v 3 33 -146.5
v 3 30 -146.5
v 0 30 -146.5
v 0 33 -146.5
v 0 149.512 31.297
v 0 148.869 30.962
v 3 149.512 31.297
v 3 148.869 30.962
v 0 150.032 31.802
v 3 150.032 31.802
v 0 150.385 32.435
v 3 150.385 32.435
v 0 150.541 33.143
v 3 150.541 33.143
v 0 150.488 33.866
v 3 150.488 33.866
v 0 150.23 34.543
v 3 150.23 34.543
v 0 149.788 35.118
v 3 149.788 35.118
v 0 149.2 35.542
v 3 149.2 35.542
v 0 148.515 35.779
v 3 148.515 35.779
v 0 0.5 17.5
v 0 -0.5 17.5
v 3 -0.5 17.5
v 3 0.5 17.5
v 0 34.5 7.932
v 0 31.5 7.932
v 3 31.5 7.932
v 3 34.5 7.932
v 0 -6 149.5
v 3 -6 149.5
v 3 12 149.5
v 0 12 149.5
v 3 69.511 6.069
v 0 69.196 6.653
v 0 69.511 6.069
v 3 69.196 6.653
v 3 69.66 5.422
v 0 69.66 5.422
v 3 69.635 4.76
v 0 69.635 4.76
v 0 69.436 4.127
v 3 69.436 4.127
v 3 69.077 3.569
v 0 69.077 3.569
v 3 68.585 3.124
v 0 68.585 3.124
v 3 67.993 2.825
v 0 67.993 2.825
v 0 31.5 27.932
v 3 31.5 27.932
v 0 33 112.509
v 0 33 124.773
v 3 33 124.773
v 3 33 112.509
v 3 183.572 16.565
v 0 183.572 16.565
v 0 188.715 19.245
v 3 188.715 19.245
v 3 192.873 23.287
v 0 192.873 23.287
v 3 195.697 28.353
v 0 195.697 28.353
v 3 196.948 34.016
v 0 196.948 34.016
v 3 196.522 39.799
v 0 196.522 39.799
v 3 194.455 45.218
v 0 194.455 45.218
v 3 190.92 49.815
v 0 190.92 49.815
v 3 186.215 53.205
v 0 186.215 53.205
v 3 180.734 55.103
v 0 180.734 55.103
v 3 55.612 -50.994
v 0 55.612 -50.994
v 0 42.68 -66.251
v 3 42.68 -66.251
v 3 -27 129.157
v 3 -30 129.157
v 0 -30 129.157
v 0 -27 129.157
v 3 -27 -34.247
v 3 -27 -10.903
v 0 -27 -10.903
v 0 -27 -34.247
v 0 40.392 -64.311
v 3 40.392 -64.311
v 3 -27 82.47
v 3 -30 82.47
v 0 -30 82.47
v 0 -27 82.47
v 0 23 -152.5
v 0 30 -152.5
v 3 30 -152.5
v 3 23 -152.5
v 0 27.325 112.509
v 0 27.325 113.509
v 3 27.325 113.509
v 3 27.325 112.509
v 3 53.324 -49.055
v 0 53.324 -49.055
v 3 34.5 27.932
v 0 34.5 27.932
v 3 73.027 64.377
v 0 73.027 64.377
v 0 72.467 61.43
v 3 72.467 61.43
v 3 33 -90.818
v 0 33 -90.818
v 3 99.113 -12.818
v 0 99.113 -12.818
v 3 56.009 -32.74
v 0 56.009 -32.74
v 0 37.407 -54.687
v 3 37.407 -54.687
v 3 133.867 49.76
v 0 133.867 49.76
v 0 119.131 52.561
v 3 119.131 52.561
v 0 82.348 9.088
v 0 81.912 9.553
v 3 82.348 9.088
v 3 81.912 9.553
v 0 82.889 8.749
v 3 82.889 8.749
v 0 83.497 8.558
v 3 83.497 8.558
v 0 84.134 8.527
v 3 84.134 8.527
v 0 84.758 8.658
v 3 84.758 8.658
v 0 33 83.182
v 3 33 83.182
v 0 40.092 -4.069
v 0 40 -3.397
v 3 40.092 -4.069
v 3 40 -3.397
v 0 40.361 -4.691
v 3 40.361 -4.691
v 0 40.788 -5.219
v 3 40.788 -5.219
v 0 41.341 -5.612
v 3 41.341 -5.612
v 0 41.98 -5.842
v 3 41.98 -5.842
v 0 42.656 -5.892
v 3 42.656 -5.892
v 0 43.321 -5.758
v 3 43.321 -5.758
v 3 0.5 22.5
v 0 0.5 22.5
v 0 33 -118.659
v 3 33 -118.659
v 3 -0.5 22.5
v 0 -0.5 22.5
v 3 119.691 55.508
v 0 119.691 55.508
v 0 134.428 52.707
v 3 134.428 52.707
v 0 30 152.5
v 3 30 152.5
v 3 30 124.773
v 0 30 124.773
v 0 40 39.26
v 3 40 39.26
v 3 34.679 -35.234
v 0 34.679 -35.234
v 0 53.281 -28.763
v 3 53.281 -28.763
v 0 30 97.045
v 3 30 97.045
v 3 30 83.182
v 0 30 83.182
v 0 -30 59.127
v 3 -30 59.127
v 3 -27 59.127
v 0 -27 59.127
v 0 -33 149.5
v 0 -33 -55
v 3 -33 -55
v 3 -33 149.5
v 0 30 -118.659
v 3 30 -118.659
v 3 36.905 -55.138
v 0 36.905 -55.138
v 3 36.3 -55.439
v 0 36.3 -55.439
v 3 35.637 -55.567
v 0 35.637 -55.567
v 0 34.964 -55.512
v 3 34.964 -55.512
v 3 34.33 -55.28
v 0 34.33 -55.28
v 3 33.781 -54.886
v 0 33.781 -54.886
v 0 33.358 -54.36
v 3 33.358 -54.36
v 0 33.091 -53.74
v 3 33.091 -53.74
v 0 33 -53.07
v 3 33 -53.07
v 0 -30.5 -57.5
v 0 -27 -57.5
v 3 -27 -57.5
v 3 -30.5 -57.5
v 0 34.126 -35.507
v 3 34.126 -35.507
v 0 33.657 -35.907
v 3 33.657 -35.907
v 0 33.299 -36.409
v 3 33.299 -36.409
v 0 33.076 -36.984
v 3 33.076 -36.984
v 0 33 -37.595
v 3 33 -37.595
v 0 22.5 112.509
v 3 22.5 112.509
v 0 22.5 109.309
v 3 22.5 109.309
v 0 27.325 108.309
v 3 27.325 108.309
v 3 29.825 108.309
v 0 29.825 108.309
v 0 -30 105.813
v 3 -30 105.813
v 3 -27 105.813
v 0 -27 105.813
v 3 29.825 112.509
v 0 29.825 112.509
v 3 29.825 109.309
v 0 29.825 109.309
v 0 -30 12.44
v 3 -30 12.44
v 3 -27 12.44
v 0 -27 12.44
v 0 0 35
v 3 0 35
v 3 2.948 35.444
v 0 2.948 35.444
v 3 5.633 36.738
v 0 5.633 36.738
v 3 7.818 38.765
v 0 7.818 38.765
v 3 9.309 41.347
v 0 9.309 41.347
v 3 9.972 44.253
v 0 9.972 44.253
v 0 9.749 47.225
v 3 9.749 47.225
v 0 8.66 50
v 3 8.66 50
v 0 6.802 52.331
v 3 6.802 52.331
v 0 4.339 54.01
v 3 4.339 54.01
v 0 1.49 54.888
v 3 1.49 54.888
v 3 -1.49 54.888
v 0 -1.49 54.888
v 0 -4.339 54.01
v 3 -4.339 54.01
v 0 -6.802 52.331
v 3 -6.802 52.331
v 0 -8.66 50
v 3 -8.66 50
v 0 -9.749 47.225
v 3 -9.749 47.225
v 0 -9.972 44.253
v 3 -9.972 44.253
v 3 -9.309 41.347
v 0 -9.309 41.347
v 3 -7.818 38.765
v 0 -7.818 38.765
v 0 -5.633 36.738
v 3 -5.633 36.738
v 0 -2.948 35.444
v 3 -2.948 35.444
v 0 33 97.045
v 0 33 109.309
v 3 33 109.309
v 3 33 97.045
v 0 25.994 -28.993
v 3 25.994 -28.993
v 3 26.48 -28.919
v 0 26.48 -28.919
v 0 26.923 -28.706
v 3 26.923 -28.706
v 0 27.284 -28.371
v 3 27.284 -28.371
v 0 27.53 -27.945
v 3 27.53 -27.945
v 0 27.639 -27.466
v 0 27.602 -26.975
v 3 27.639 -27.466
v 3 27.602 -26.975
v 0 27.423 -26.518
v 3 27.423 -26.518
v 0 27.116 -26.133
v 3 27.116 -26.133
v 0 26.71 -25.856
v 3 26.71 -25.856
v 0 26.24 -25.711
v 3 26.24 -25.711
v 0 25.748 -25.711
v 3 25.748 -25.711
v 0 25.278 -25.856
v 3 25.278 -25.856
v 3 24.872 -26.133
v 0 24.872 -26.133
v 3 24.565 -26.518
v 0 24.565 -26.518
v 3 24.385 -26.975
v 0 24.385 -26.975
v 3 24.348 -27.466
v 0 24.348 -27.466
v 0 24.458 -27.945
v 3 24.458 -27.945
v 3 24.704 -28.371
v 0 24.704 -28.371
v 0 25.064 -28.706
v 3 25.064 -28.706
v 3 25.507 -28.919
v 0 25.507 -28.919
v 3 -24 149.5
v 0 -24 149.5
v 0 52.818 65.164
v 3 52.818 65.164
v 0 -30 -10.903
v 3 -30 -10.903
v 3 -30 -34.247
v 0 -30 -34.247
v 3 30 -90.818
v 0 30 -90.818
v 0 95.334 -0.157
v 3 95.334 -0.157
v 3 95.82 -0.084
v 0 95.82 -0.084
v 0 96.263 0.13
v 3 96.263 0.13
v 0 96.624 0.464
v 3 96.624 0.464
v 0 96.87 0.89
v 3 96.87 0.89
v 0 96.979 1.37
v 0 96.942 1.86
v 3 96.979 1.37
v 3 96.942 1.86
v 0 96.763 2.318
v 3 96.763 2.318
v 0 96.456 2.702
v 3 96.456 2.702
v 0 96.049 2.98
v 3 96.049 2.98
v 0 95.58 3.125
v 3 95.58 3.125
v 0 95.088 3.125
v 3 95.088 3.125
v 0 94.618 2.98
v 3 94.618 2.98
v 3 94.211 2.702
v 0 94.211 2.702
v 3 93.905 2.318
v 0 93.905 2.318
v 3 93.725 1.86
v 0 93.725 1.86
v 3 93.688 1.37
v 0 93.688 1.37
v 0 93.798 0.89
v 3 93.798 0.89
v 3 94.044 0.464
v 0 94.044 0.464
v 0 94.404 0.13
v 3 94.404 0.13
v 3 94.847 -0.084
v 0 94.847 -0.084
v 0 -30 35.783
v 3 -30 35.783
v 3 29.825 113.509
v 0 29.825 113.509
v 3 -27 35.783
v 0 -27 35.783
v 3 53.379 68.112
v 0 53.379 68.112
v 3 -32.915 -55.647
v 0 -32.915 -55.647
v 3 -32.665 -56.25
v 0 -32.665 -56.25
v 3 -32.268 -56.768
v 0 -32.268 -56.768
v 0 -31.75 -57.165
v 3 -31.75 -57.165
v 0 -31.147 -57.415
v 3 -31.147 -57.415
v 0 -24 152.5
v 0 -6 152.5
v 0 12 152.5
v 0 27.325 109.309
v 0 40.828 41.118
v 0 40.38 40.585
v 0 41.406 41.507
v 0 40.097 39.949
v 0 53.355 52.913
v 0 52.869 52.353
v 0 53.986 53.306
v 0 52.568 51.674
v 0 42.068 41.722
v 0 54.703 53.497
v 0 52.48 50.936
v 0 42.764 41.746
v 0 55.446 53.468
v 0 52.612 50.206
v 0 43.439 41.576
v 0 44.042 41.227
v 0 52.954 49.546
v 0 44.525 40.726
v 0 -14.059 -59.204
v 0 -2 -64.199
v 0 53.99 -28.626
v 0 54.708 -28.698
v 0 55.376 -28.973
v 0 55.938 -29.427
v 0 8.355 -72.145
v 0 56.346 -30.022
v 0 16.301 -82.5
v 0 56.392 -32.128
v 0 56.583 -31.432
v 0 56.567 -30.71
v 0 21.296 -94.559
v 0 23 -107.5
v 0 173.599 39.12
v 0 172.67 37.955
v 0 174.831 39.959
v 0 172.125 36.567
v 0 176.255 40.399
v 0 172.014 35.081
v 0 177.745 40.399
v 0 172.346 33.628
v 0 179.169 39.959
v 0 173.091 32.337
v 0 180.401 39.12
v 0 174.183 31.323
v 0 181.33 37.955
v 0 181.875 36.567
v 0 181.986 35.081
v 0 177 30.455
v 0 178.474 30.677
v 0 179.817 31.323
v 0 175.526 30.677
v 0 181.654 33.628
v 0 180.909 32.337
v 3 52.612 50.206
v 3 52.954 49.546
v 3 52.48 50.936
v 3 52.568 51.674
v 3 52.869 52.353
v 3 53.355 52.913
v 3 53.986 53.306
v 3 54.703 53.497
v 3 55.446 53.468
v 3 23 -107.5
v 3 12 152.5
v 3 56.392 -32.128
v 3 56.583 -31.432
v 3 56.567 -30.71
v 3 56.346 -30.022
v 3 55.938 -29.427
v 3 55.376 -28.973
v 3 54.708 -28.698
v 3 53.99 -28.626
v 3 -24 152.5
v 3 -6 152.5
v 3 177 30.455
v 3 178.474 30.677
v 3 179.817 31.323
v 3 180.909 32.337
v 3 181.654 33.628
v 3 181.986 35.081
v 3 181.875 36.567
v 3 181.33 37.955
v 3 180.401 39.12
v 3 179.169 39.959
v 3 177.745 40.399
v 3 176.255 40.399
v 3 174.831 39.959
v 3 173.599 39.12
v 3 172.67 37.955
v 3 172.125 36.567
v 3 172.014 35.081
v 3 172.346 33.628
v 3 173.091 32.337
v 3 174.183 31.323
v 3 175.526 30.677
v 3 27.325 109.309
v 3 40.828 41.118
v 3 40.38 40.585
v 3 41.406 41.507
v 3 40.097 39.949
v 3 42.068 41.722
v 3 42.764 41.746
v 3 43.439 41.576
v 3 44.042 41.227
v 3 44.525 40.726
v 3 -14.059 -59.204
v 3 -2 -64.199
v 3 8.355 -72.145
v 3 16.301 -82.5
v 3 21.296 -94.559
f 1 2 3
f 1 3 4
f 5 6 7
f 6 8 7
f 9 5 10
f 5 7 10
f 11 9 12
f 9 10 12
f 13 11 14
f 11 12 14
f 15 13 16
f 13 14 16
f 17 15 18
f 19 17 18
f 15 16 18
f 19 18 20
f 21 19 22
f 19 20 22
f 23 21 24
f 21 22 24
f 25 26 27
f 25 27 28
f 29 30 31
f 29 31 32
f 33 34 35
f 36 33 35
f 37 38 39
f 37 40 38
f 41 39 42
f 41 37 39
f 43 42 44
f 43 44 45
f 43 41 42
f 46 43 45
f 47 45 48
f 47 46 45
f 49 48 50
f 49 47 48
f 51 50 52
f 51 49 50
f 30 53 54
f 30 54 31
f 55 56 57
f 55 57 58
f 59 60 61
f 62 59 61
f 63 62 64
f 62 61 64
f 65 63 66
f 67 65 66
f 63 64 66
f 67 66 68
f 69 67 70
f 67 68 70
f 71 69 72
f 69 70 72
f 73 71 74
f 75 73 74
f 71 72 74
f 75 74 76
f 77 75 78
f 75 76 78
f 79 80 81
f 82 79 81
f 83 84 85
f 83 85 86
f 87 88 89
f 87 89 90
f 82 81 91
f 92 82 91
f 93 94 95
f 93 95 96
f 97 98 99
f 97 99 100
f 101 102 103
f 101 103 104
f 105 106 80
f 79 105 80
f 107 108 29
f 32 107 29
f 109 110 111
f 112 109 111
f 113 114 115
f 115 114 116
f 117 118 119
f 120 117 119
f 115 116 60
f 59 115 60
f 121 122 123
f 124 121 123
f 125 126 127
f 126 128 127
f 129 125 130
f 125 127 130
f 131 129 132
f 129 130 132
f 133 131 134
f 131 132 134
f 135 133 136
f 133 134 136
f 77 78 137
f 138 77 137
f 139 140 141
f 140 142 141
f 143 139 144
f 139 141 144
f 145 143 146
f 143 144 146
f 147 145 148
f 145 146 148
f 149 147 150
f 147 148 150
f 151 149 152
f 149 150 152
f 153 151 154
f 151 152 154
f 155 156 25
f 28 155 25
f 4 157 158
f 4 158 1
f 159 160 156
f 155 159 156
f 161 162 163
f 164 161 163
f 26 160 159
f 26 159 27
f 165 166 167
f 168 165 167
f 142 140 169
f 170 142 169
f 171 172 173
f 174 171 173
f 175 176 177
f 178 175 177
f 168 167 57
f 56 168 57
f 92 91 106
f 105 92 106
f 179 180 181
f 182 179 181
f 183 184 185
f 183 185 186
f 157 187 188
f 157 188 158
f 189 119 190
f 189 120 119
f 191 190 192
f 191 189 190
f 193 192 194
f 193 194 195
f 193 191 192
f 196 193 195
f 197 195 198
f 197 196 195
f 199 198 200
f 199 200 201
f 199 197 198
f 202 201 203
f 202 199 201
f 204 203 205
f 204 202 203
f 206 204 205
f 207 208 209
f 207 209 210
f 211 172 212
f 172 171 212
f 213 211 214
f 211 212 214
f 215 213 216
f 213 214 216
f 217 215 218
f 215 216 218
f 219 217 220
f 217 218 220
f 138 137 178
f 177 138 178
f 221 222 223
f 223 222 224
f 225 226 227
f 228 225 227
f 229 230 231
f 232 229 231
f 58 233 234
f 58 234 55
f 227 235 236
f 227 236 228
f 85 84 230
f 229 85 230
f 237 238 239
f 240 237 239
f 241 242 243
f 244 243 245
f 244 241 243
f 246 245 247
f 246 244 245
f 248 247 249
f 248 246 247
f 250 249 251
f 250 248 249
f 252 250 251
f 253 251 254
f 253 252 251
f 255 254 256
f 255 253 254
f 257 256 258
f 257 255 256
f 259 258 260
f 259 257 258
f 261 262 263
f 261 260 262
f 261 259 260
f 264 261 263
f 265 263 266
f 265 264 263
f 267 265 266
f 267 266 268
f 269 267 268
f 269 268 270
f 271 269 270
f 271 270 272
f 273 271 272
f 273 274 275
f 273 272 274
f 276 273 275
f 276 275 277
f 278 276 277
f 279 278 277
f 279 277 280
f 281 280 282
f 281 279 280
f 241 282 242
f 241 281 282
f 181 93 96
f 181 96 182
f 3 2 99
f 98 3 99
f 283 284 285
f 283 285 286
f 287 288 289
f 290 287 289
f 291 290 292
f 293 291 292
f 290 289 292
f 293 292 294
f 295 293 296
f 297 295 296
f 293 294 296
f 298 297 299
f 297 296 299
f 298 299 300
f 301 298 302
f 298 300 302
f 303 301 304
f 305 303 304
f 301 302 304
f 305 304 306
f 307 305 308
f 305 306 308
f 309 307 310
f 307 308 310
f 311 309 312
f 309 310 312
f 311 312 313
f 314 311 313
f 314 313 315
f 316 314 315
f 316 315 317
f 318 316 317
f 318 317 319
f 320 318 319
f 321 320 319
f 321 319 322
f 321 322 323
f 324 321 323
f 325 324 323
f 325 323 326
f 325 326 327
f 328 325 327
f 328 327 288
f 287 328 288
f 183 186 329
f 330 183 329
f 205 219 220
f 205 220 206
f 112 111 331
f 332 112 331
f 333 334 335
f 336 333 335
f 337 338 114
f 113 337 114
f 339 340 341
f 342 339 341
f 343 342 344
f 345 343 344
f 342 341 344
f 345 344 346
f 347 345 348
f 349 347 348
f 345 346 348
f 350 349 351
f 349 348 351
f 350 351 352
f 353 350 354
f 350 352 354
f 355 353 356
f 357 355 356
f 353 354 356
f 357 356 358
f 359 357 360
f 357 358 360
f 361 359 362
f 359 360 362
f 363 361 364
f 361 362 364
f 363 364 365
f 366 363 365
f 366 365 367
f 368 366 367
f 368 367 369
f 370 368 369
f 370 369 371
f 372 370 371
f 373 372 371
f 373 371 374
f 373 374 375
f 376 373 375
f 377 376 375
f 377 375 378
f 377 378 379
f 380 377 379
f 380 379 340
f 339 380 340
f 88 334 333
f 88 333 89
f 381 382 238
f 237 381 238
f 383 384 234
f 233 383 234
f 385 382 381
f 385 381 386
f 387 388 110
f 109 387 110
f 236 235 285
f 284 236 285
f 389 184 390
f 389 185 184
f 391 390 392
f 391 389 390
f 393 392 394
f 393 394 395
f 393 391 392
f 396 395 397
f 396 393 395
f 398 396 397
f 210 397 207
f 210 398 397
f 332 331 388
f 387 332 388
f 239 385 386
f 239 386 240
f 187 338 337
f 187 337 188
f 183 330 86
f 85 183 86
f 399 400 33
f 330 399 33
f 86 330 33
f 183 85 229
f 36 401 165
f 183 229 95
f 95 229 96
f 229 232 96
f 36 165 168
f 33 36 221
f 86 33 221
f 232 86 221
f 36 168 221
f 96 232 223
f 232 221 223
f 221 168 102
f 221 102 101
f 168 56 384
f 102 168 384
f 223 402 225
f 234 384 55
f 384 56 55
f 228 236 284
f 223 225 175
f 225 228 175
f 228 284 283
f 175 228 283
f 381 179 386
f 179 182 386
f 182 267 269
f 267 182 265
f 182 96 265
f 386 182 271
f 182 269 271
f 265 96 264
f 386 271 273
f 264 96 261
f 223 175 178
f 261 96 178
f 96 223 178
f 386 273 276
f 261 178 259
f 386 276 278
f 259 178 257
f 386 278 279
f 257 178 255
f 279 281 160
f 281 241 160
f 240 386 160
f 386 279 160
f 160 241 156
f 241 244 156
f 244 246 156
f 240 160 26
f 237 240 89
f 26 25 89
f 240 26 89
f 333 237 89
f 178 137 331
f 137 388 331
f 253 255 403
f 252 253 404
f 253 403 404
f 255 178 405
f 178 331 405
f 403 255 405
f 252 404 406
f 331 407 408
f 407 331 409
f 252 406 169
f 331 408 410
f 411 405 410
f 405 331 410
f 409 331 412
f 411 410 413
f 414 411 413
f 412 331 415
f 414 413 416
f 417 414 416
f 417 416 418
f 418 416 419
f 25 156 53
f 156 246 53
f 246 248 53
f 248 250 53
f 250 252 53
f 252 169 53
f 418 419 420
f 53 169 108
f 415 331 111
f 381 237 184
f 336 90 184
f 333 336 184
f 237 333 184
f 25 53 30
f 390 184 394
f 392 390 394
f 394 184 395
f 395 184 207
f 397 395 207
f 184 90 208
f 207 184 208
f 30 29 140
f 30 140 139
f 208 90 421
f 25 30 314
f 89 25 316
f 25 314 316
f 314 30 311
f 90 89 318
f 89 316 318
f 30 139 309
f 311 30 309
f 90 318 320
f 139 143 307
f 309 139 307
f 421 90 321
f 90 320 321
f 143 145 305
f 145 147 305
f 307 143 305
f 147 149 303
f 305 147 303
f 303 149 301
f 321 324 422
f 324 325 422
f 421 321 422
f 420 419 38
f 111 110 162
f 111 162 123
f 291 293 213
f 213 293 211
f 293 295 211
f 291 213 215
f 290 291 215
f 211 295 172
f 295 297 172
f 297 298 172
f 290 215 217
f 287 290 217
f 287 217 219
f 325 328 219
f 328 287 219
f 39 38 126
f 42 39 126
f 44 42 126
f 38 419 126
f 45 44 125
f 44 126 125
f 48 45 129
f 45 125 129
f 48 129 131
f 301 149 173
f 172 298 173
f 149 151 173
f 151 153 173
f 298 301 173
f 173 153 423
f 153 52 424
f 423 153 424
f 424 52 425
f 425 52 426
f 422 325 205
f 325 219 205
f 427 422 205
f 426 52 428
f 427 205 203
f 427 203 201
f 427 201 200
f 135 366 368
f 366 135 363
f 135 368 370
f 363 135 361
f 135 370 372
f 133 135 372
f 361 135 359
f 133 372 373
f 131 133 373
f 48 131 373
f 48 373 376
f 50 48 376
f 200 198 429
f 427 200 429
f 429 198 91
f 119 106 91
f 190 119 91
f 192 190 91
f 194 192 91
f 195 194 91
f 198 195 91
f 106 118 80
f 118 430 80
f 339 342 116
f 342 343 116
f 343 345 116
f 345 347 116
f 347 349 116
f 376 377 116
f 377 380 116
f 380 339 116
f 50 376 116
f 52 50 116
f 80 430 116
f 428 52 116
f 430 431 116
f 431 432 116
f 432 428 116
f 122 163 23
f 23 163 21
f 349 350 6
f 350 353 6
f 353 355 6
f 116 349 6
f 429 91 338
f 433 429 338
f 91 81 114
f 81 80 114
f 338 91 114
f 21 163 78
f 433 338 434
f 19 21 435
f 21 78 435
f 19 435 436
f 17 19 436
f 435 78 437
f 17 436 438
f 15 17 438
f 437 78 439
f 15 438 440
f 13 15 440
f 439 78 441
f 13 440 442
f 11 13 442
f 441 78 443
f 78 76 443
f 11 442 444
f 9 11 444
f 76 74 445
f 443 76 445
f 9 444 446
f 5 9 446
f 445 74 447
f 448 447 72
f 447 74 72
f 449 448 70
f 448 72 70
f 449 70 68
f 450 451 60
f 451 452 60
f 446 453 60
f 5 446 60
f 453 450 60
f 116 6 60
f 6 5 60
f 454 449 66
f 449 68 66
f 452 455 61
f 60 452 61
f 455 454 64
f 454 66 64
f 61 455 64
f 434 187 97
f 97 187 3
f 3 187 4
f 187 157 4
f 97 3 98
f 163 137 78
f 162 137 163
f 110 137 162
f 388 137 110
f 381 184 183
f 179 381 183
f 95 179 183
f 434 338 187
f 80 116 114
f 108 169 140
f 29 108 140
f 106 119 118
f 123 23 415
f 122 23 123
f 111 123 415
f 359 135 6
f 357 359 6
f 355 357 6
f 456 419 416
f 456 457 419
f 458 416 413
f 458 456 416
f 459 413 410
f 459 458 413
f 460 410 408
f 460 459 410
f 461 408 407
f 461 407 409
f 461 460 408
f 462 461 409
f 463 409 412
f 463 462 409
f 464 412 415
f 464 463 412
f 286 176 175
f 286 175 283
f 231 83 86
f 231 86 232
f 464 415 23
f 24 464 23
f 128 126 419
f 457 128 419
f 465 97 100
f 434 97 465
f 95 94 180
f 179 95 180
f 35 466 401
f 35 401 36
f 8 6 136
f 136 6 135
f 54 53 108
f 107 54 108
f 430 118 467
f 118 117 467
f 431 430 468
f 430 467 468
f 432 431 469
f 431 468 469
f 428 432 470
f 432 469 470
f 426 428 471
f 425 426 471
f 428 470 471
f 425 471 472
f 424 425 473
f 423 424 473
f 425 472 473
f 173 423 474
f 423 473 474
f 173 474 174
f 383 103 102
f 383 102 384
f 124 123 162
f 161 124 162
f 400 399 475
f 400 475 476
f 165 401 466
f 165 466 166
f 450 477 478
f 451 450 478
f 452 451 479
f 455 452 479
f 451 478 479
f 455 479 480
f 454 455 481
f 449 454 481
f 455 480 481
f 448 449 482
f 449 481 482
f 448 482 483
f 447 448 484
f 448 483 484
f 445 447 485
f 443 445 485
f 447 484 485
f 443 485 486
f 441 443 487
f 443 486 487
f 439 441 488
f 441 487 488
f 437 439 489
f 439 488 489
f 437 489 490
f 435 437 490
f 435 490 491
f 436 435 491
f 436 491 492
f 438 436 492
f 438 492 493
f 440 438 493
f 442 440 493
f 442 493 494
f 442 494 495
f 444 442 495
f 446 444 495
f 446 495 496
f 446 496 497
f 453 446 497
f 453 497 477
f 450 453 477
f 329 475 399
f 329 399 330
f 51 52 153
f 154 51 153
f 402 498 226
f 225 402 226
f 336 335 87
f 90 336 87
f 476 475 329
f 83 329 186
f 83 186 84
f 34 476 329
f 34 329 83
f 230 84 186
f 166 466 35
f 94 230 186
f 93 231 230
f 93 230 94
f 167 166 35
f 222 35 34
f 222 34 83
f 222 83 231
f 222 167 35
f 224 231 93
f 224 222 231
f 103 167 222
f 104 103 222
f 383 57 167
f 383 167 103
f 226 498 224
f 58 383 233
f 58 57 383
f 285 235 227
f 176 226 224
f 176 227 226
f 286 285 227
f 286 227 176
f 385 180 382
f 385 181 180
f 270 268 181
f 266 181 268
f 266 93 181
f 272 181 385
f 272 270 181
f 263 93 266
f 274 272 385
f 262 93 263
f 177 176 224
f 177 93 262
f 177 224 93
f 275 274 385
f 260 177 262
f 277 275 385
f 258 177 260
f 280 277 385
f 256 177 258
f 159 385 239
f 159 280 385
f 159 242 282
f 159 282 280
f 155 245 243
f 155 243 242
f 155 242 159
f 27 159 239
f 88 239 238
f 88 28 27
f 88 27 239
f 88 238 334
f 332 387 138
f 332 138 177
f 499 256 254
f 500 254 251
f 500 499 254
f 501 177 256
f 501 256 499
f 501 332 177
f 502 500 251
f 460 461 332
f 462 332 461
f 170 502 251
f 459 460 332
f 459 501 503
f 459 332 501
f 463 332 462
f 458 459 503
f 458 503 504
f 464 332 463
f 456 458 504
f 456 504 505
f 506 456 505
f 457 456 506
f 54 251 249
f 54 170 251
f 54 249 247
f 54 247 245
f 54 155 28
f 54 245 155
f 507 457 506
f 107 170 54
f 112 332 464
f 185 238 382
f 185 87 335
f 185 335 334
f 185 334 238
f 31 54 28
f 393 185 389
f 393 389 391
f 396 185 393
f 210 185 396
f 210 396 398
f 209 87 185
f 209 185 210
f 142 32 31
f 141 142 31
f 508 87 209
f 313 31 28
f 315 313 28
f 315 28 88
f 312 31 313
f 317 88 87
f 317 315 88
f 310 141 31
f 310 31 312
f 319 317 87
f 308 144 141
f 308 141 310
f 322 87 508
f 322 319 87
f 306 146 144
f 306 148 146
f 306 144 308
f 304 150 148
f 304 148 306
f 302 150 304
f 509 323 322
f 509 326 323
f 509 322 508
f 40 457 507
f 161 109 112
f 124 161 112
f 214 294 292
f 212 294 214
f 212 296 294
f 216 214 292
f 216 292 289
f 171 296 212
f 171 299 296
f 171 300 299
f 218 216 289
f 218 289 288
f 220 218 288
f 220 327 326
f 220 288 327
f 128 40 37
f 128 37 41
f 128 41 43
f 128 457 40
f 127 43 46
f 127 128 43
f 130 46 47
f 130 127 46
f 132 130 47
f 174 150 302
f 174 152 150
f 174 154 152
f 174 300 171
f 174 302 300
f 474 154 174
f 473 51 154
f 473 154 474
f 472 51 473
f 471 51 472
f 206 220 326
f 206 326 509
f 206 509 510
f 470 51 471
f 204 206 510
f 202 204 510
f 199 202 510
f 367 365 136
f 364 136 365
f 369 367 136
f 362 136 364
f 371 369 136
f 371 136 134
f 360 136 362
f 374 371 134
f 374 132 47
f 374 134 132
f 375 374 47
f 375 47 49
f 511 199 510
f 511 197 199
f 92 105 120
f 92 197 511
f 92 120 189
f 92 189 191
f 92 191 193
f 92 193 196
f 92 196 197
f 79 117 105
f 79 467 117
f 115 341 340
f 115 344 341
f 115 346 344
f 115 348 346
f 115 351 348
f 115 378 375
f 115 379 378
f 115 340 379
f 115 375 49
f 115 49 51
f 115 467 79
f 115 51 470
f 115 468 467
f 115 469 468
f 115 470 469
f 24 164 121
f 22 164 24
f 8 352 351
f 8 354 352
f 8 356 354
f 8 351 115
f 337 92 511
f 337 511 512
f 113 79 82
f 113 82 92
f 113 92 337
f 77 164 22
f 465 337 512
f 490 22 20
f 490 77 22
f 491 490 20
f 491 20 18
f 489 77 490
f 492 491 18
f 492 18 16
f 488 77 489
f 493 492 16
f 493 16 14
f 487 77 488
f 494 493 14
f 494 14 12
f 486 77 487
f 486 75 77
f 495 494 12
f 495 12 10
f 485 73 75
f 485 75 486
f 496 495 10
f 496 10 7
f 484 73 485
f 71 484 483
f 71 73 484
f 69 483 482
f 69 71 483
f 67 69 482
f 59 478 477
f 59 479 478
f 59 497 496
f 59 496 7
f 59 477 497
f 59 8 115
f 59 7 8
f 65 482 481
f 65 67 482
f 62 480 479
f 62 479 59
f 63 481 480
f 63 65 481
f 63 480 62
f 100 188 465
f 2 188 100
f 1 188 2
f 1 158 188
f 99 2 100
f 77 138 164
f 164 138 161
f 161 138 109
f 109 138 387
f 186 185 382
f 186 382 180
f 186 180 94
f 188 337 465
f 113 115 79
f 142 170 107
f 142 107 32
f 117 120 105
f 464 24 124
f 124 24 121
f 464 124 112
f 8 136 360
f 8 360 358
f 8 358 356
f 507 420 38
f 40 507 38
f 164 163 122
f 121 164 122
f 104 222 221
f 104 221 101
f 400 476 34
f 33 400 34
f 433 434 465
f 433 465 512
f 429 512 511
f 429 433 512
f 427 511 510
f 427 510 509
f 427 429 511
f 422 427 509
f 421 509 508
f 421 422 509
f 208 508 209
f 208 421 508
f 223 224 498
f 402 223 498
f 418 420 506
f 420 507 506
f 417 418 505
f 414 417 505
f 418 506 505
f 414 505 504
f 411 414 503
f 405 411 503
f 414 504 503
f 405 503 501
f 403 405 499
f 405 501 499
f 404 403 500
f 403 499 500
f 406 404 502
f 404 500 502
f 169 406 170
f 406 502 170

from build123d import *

# Parameters (mm, degrees)
BOSS_EXTRUDE1_DEPTH     = 3
SKETCH2_W               = 27.727272727
SKETCH2_H               = 3
SKETCH2_W_2             = 3
SKETCH2_H_2             = 18
SKETCH2_H_3             = 9
SKETCH2_W_3             = 23.343342349
SKETCH2_W_4             = 23.34334235
SKETCH2_W_5             = 6
CUT_EXTRUDE1_DEPTH      = 1
CUT_EXTRUDE1_DEPTH_BACK = 4
SKETCH3_W               = 3.2
SKETCH3_H               = 10.5
SKETCH3_W_2             = 5.2
SKETCH3_H_2             = 2.5
CUT_EXTRUDE2_DEPTH      = 1
CUT_EXTRUDE2_DEPTH_BACK = 4
FILLET1_R               = 2.5
BOSS_EXTRUDE2_DEPTH     = 3
FILLET2_R               = 2.5
SKETCH6_R               = 5
SKETCH6_R_2             = 1.65
CUT_EXTRUDE5_DEPTH      = 1
CUT_EXTRUDE5_DEPTH_BACK = 4
SKETCH8_R               = 10
SKETCH8_W               = 5
SKETCH8_H               = 1
CUT_EXTRUDE6_DEPTH      = 4
CUT_EXTRUDE6_DEPTH_BACK = 1
SKETCH9_W               = 20
SKETCH9_H               = 3
CUT_EXTRUDE7_DEPTH      = 4
CUT_EXTRUDE7_DEPTH_BACK = 1
SKETCH10_W              = 27.840909091
SKETCH10_H              = 3
CUT_EXTRUDE8_DEPTH      = 4
CUT_EXTRUDE8_DEPTH_BACK = 1


with BuildPart() as part:
    # Sketch1 → Boss-Extrude1 (new body)
    with BuildSketch(Plane(origin=(0, 0, 0), x_dir=(0, 0, -1), z_dir=(1, 0, 0))):
        with BuildLine():
            Line((-152.5, 33), (152.5, 33))
            Line((152.5, 33), (152.5, 23))
            Line((152.5, 23), (107.5, 23))
            ThreePointArc((107.5, 23), (72.144660941, 8.355339059), (57.5, -27))
            Line((57.5, -27), (57.5, -33))
            Line((57.5, -33), (-152.5, -33))
            Line((-152.5, -33), (-152.5, 33))
        make_face()
    extrude(amount=BOSS_EXTRUDE1_DEPTH)

    # Sketch2 → Cut-Extrude1 (cut, two sides)
    with BuildSketch(Plane(origin=(3, 0, 0), x_dir=(0, 0, -1), z_dir=(1, 0, 0))) as cut_extrude1_sk:
        with Locations((-138.636363636, 31.5)):
            Rectangle(SKETCH2_W, SKETCH2_H)
        with Locations((-83.181818182, 31.5)):
            Rectangle(SKETCH2_W, SKETCH2_H)
        with Locations((-27.727272728, 31.5)):
            Rectangle(SKETCH2_W, SKETCH2_H)
        with Locations((-151, 3)):
            Rectangle(SKETCH2_W_2, SKETCH2_H_2)
        with Locations((-151, -28.5)):
            Rectangle(SKETCH2_W_2, SKETCH2_H_3)
        with Locations((-117.484986475, -28.5)):
            Rectangle(SKETCH2_W_3, SKETCH2_H)
        with Locations((-70.798301777, -28.5)):
            Rectangle(SKETCH2_W_3, SKETCH2_H)
        with Locations((22.575067622, -28.5)):
            Rectangle(SKETCH2_W_4, SKETCH2_H)
        with Locations((149.5, 31.5)):
            Rectangle(SKETCH2_W_5, SKETCH2_H)
        with Locations((-24.111617078, -28.5)):
            Rectangle(SKETCH2_W_3, SKETCH2_H)
    extrude(amount=CUT_EXTRUDE1_DEPTH, mode=Mode.SUBTRACT)
    extrude(cut_extrude1_sk.sketch, amount=-CUT_EXTRUDE1_DEPTH_BACK, mode=Mode.SUBTRACT)

    # Sketch3 → Cut-Extrude2 (cut, two sides)
    with BuildSketch(Plane(origin=(3, 0, 0), x_dir=(0, 0, -1), z_dir=(1, 0, 0))) as cut_extrude2_sk:
        with Locations((-110.909090909, 27.75)):
            Rectangle(SKETCH3_W, SKETCH3_H)
        with Locations((-110.909090909, 28.575)):
            Rectangle(SKETCH3_W_2, SKETCH3_H_2)
    extrude(amount=CUT_EXTRUDE2_DEPTH, mode=Mode.SUBTRACT)
    extrude(cut_extrude2_sk.sketch, amount=-CUT_EXTRUDE2_DEPTH_BACK, mode=Mode.SUBTRACT)

    # Fillet1
    fillet1_edges = [part.edges().sort_by_distance(p)[0] for p in [
        (1.5, -33, -57.5),
    ]]
    fillet(fillet1_edges, radius=FILLET1_R)

    # Sketch4 → Boss-Extrude2 (add)
    with BuildSketch(Plane(origin=(0, 0, 0), x_dir=(0, 0, -1), z_dir=(1, 0, 0))):
        with BuildLine():
            Line((-83.181818182, 33), (-83.181818182, 30))
            Line((-83.181818182, 30), (35.818181818, 30))
            Line((35.818181818, 30), (35.818181818, 33))
            Line((35.818181818, 33), (25.753026775, 61.931534749))
            Line((25.753026775, 61.931534749), (59.886459158, 33))
            Line((59.886459158, 33), (90.818181818, 33))
            Line((90.818181818, 33), (12.817635516, 99.113348651))
            Line((12.817635516, 99.113348651), (-16.565017269, 183.571584658))
            ThreePointArc((-16.565017269, 183.571584658), (-36.922973482, 196.946020133), (-55.102803407, 180.73442893))
            Line((-55.102803407, 180.73442893), (-83.181818182, 33))
        make_face()
        Polygon((-54.643252411, 49.263022537), (-34.033564648, 157.698467174), (-8.047004759, 83.002045982), align=None, mode=Mode.SUBTRACT)
        Polygon((-3.929894771, 71.167721507), (6.913219914, 40), (-46.974972009, 40), align=None, mode=Mode.SUBTRACT)
    extrude(amount=BOSS_EXTRUDE2_DEPTH)

    # Fillet2
    fillet2_edges = [part.edges().sort_by_distance(p)[0] for p in [
        (1.5, 33, -59.886459158),
        (1.5, 61.931534749, -25.753026775),
        (1.5, 33, -35.818181818),
        (1.5, 40, -6.913219914),
        (1.5, 71.167721507, 3.929894771),
        (1.5, 40, 46.974972009),
        (1.5, 49.263022537, 54.643252411),
        (1.5, 83.002045982, 8.047004759),
        (1.5, 157.698467174, 34.033564648),
    ]]
    fillet(fillet2_edges, radius=FILLET2_R)

    # Sketch6 → Cut-Extrude5 (cut, two sides)
    with BuildSketch(Plane(origin=(3, 0, 0), x_dir=(0, 0, -1), z_dir=(1, 0, 0))) as cut_extrude5_sk:
        with Locations((-35.454545455, 177)):
            Circle(SKETCH6_R)
        with Locations((-1.492946709, 95.333591431)):
            Circle(SKETCH6_R_2)
        with Locations((27.342535354, 25.993797473)):
            Circle(SKETCH6_R_2)
    extrude(amount=CUT_EXTRUDE5_DEPTH, mode=Mode.SUBTRACT)
    extrude(cut_extrude5_sk.sketch, amount=-CUT_EXTRUDE5_DEPTH_BACK, mode=Mode.SUBTRACT)

    # Sketch8 → Cut-Extrude6 (cut, two sides)
    with BuildSketch(Plane(origin=(0, 0, 0), x_dir=(0, 0, -1), z_dir=(1, 0, 0))) as cut_extrude6_sk:
        with Locations((-45, 0)):
            Circle(SKETCH8_R)
        with Locations((-20, 0)):
            Rectangle(SKETCH8_W, SKETCH8_H)
    extrude(amount=CUT_EXTRUDE6_DEPTH, mode=Mode.SUBTRACT)
    extrude(cut_extrude6_sk.sketch, amount=-CUT_EXTRUDE6_DEPTH_BACK, mode=Mode.SUBTRACT)

    # Sketch9 → Cut-Extrude7 (cut, two sides)
    with BuildSketch(Plane(origin=(0, 0, 0), x_dir=(0, 0, -1), z_dir=(1, 0, 0))) as cut_extrude7_sk:
        Polygon((-68.111670983, 53.378521315), (-64.377242053, 73.026779267), (-61.43000336, 72.466614928), (-65.16443229, 52.818356975), align=None)
        Polygon((-55.507973344, 119.691391905), (-52.707151647, 134.427585369), (-49.759912954, 133.867421029), (-52.560734651, 119.131227565), align=None)
        Polygon((64.311409407, 40.391956194), (49.054577079, 53.32366402), (50.994333253, 55.612188869), (66.251165581, 42.680481043), align=None)
        with Locations((-17.931502251, 33)):
            Rectangle(SKETCH9_W, SKETCH9_H)
    extrude(amount=CUT_EXTRUDE7_DEPTH, mode=Mode.SUBTRACT)
    extrude(cut_extrude7_sk.sketch, amount=-CUT_EXTRUDE7_DEPTH_BACK, mode=Mode.SUBTRACT)

    # Sketch10 → Cut-Extrude8 (cut, two sides)
    with BuildSketch(Plane(origin=(0, 0, 0), x_dir=(0, 0, -1), z_dir=(1, 0, 0))) as cut_extrude8_sk:
        with Locations((104.738636364, 31.5)):
            Rectangle(SKETCH10_W, SKETCH10_H)
    extrude(amount=CUT_EXTRUDE8_DEPTH, mode=Mode.SUBTRACT)
    extrude(cut_extrude8_sk.sketch, amount=-CUT_EXTRUDE8_DEPTH_BACK, mode=Mode.SUBTRACT)


solid = part.part
